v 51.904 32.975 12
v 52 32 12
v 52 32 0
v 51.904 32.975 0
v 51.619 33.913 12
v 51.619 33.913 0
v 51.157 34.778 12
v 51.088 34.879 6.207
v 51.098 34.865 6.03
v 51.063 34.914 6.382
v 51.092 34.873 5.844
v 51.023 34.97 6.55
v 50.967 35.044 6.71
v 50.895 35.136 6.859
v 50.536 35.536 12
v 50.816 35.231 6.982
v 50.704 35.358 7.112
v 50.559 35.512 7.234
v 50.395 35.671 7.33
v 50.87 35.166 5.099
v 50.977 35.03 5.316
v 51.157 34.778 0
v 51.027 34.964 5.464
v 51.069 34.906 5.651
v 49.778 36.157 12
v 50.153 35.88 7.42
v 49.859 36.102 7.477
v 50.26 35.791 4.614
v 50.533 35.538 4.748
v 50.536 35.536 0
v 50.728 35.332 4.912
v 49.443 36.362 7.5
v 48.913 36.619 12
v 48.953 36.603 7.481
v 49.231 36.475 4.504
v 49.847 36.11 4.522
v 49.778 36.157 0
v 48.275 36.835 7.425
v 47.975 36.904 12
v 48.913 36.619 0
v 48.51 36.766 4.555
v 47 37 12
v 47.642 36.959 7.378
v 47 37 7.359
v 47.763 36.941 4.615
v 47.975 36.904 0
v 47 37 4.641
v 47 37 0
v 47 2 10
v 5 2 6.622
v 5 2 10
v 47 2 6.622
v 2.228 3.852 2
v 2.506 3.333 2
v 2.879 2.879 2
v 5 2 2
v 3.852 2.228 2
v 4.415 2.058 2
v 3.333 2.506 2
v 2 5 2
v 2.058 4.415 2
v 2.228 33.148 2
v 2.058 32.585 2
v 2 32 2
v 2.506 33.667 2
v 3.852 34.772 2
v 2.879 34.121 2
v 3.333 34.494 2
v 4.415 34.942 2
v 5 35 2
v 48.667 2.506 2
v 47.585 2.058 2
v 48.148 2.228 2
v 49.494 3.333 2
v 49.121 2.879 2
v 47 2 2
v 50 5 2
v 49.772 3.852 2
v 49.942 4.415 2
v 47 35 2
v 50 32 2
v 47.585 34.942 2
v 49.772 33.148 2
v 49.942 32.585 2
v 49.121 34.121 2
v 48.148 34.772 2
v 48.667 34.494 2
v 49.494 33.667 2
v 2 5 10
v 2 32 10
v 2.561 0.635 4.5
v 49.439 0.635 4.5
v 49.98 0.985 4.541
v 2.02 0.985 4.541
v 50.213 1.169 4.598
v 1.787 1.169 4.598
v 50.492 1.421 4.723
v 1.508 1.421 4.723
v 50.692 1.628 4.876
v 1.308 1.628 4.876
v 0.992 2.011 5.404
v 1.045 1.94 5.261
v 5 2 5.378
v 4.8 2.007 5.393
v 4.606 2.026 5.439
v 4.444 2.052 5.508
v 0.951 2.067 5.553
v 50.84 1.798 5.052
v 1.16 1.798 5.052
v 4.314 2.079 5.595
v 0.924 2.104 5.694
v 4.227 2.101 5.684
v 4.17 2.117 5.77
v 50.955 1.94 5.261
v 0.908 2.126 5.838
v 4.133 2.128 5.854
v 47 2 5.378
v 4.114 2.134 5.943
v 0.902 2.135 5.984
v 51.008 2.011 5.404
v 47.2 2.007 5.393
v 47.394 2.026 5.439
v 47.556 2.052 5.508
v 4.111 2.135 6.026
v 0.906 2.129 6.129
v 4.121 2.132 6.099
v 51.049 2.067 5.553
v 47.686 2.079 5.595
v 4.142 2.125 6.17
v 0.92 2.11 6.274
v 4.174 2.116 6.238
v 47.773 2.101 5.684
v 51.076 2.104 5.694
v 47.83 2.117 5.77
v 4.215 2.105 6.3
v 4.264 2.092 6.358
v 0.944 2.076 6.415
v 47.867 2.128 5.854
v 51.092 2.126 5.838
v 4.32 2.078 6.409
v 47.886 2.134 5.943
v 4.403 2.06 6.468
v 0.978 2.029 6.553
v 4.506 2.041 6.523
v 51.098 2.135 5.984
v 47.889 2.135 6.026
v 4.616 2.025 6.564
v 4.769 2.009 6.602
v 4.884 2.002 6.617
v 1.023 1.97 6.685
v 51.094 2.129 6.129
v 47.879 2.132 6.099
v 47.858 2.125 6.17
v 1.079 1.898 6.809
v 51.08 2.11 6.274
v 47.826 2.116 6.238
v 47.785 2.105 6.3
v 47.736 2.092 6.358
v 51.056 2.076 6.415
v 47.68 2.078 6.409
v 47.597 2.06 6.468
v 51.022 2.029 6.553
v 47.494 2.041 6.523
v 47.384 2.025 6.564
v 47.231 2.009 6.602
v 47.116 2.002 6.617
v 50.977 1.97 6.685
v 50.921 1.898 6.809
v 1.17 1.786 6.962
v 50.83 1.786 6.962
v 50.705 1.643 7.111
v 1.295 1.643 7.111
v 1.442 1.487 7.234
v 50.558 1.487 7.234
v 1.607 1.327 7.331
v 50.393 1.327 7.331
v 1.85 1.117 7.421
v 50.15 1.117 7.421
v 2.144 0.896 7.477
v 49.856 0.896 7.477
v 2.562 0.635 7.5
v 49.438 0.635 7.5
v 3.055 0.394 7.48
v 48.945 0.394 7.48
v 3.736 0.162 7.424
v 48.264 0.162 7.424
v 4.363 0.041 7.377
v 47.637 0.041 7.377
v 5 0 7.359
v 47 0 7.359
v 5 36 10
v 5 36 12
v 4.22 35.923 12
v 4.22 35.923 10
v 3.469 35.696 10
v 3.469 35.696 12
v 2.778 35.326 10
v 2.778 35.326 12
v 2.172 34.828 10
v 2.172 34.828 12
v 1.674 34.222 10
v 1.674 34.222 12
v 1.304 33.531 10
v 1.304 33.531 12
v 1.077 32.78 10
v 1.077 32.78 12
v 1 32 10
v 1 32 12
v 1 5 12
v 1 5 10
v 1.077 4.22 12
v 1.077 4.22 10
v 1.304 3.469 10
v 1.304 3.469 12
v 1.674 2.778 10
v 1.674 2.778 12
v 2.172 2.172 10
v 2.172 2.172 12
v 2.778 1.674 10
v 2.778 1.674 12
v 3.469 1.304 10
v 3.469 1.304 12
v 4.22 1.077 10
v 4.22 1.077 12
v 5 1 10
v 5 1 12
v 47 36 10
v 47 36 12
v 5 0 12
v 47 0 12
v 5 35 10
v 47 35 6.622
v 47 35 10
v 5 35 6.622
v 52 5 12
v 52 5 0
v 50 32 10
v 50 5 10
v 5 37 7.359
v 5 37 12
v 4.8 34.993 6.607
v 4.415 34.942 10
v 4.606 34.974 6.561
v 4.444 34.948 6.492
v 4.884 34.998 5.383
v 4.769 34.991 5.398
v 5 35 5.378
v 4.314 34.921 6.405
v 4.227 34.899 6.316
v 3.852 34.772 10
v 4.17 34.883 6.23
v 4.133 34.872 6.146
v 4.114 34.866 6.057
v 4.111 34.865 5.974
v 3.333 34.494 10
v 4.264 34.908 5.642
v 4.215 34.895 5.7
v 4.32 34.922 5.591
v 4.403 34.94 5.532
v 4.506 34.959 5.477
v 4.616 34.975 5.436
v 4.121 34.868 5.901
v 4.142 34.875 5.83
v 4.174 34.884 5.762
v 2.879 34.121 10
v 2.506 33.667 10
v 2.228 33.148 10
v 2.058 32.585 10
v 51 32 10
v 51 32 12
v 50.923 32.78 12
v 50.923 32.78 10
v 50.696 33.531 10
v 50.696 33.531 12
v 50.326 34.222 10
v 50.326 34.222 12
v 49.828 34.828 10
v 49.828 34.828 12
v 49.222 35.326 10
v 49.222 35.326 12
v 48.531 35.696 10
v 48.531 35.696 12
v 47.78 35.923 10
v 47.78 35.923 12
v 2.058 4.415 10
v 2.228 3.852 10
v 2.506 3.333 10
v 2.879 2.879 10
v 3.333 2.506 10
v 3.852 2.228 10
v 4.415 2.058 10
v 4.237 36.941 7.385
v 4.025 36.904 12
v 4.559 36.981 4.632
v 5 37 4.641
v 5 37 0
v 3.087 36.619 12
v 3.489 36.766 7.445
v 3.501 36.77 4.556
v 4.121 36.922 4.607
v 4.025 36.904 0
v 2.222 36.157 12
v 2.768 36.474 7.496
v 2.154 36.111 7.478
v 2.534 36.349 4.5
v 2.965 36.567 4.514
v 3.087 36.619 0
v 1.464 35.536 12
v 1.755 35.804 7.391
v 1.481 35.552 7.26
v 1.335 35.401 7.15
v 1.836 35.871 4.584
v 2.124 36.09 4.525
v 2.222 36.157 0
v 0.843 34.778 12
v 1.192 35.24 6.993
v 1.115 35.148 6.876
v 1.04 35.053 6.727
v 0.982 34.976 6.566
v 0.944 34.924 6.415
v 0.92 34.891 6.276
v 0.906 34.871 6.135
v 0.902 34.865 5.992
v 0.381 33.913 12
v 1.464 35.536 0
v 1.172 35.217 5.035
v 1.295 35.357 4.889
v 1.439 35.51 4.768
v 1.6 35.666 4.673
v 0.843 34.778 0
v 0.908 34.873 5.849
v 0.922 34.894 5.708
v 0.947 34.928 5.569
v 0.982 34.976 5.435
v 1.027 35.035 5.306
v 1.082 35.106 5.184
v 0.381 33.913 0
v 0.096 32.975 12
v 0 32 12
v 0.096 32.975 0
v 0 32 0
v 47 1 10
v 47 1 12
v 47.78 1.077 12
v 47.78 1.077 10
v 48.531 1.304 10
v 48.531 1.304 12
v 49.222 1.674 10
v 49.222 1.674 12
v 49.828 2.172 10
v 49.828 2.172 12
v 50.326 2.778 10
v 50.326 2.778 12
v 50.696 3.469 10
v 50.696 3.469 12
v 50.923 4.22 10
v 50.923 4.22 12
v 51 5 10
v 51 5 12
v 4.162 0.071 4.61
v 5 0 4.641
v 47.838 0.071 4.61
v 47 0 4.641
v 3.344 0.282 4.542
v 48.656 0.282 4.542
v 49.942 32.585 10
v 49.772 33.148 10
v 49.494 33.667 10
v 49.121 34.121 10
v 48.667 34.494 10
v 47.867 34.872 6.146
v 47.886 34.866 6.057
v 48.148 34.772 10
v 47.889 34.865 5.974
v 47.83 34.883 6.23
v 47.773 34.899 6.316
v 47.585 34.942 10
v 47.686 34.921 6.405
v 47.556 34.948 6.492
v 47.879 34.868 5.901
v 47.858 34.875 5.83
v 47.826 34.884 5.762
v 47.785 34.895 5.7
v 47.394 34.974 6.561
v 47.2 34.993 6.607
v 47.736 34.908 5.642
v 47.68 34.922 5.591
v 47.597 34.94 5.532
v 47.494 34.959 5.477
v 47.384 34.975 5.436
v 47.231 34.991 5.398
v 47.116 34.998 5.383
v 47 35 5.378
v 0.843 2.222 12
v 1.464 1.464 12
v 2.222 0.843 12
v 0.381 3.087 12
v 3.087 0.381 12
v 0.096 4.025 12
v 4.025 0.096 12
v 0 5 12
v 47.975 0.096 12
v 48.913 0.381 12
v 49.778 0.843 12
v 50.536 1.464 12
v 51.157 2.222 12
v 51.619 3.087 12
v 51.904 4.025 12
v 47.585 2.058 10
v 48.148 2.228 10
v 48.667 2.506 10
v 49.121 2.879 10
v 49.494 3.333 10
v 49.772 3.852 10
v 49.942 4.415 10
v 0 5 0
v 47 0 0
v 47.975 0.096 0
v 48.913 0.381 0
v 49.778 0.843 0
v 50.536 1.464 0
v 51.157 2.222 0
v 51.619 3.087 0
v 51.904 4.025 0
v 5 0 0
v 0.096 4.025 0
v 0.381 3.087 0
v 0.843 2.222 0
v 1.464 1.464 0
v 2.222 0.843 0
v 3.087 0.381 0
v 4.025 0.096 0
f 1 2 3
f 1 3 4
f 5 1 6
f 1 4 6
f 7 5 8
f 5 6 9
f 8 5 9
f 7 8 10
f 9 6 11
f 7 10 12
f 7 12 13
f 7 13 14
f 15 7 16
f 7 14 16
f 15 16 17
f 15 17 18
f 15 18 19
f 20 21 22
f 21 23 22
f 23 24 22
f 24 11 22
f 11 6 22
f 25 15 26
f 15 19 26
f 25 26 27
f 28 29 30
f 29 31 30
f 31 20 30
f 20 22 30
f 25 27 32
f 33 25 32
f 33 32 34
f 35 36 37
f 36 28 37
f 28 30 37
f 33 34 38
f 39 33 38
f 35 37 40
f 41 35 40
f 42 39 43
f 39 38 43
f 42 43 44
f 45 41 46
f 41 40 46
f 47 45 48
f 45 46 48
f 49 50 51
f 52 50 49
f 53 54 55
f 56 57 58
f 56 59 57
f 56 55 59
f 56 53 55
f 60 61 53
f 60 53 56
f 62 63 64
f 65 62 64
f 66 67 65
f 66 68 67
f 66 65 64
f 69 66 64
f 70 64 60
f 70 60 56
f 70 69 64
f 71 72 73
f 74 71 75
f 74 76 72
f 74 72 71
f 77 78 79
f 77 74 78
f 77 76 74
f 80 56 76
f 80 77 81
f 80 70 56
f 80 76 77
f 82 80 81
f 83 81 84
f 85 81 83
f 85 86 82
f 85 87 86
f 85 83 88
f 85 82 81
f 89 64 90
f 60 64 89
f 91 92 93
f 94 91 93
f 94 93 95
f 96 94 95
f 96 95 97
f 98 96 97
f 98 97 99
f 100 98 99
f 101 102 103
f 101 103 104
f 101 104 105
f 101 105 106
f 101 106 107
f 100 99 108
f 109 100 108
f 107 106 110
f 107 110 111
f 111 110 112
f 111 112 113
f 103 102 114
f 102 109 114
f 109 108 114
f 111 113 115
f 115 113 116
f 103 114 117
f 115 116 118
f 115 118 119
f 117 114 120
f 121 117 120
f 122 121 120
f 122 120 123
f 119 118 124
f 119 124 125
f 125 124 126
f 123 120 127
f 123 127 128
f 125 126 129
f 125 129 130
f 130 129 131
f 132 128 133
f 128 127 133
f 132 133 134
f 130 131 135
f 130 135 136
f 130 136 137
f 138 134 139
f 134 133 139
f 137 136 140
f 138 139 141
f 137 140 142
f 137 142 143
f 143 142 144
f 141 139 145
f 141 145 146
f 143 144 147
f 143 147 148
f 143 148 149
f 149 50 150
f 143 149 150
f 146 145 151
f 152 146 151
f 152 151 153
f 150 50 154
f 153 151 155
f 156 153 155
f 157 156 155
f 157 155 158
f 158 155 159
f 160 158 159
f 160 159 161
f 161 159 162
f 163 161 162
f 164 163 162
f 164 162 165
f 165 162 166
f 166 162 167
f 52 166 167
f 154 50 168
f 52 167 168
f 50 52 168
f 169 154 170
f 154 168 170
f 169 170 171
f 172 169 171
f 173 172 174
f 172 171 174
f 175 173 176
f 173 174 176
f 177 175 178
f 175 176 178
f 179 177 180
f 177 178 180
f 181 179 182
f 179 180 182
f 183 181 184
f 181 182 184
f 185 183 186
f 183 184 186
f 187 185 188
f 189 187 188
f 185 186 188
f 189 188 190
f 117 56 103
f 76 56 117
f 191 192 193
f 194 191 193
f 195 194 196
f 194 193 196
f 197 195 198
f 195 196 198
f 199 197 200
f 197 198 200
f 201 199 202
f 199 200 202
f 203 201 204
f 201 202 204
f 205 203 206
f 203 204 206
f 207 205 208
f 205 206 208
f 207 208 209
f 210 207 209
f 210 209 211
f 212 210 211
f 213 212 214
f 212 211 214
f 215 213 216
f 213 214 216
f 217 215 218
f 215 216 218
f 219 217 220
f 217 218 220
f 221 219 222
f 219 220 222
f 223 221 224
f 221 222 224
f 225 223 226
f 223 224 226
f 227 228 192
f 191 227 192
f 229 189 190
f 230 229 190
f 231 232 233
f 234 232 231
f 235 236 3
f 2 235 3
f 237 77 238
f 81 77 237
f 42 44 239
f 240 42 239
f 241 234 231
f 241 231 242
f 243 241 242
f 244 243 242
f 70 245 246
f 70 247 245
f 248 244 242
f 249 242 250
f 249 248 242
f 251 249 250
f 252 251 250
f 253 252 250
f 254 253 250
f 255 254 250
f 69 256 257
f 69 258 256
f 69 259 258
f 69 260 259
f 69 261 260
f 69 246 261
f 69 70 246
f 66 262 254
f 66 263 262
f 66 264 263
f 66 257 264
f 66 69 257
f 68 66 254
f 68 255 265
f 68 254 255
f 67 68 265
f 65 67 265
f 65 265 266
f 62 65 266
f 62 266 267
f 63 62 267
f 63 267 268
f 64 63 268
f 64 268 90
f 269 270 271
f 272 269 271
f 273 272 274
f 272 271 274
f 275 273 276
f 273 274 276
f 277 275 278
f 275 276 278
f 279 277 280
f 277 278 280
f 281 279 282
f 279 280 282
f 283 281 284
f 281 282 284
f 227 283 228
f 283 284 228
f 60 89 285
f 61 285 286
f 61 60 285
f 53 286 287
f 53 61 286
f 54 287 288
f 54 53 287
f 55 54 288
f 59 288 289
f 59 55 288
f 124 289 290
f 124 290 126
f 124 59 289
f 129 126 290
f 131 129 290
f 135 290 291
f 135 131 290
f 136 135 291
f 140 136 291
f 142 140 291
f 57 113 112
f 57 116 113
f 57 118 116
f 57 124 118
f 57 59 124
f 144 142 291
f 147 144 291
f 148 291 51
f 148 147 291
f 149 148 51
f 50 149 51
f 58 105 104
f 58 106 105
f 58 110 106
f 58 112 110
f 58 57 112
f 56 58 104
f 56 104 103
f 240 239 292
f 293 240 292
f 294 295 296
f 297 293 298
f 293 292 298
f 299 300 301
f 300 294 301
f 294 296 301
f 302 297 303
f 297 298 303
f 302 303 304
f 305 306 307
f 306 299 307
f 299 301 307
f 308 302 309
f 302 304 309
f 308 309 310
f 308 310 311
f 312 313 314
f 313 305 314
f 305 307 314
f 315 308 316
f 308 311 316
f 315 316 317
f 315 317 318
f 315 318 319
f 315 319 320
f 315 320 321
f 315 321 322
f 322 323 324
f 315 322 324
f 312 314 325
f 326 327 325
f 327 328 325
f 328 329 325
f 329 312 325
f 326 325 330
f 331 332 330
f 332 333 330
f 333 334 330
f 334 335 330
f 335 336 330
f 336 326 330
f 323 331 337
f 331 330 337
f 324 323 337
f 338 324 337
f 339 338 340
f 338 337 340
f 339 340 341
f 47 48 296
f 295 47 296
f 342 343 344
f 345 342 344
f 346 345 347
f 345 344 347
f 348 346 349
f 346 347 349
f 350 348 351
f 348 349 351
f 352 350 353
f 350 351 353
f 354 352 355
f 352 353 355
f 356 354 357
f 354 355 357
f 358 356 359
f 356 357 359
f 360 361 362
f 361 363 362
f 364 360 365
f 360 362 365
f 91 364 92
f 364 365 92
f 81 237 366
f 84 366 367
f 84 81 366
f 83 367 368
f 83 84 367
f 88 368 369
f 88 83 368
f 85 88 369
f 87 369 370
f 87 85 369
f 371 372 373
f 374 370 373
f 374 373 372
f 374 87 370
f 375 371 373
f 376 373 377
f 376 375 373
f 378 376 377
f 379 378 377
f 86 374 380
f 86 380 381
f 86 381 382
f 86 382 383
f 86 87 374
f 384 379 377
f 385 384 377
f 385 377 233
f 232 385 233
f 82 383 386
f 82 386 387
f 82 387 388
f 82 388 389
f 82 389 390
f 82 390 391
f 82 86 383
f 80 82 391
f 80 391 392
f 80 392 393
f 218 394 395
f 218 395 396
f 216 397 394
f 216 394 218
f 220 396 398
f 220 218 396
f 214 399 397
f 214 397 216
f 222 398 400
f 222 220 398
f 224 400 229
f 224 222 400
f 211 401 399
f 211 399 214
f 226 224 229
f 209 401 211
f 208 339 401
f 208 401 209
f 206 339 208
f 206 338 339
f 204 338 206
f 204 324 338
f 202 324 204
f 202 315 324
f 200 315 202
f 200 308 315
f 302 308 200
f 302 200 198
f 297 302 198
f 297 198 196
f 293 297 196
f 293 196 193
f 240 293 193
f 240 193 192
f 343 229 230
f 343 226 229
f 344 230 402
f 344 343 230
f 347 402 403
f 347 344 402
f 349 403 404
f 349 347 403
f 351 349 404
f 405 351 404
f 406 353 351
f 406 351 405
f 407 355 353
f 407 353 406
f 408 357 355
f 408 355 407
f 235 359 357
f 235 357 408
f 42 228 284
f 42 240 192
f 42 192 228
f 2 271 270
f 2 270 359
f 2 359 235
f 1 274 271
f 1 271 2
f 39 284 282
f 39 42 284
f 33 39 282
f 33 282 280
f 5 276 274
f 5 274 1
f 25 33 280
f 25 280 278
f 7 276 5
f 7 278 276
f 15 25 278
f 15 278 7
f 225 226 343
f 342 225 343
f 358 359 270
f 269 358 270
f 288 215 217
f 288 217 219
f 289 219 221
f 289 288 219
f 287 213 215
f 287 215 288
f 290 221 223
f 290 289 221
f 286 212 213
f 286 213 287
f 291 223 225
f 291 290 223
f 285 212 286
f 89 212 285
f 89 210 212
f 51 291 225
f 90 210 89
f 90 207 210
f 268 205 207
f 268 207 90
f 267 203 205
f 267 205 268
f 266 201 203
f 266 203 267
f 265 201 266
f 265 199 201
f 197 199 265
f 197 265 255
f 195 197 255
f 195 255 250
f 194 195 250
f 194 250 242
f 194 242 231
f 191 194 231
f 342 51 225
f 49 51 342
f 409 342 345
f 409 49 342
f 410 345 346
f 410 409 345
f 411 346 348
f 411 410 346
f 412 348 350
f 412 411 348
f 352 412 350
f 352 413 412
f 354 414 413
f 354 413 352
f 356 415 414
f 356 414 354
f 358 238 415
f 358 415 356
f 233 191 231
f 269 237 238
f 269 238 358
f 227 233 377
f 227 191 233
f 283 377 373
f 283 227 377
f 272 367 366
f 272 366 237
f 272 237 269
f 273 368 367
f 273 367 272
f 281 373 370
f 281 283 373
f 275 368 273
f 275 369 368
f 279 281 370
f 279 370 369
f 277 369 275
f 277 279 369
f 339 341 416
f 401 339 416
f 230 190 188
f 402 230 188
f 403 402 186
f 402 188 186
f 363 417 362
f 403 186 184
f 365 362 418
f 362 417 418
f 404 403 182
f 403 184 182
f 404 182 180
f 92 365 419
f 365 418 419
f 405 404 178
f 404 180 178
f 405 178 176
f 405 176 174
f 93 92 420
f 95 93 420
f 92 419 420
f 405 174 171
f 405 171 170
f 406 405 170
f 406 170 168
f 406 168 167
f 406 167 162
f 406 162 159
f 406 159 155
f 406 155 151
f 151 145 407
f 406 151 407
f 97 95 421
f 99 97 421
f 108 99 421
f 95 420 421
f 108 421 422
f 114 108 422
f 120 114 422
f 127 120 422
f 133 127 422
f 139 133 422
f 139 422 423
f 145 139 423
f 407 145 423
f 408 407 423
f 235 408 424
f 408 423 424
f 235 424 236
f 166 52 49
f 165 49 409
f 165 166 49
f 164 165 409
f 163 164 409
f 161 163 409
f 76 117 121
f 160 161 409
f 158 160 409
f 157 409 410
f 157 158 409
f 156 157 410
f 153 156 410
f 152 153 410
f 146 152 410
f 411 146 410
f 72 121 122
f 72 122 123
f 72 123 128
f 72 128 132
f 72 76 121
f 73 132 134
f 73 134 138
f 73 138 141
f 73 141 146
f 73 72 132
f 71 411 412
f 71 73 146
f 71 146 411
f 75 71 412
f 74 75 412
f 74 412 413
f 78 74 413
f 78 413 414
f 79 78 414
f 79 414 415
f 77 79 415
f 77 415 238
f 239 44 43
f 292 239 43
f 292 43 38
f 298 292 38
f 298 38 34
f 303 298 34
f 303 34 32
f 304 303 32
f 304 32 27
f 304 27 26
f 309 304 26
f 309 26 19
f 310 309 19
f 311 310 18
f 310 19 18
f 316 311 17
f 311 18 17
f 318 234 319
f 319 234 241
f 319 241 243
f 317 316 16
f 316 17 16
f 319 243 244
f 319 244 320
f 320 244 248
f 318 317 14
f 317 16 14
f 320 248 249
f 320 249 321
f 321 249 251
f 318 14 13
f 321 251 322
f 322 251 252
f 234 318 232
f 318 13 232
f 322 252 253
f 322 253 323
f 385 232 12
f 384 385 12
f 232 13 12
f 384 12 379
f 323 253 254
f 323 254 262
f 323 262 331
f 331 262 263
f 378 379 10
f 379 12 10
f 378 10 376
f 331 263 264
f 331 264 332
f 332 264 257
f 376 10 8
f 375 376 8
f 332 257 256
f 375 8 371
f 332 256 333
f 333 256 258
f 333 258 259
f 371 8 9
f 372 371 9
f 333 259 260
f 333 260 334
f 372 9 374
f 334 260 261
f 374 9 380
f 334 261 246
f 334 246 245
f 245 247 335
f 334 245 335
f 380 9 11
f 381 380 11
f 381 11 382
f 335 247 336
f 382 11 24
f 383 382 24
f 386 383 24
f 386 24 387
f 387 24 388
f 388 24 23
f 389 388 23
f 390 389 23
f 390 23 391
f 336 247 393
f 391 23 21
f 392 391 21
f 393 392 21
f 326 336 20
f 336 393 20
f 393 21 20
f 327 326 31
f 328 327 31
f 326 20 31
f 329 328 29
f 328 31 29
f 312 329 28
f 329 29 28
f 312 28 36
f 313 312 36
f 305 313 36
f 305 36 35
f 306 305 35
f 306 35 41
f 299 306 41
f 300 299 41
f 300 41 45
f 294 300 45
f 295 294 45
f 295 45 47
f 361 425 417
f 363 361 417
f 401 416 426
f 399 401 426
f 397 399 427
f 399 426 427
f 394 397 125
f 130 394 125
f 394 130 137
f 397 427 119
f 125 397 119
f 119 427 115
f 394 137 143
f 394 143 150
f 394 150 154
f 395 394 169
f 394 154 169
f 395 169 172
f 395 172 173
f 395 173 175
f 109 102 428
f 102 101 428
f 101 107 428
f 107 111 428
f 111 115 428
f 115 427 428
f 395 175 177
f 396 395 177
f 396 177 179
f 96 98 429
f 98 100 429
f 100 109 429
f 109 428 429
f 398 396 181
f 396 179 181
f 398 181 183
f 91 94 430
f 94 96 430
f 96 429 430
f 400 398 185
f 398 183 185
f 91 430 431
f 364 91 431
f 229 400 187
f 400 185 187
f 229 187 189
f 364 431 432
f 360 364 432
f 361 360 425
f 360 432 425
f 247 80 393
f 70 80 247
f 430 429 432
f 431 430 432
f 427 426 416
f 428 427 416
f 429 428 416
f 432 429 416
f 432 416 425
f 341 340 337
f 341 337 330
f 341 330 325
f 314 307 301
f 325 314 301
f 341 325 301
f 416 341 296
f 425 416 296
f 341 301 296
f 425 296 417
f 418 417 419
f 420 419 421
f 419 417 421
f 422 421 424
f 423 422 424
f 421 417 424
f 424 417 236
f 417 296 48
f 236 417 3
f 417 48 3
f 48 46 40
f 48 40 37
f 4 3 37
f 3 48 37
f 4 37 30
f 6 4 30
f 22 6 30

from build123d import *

# Parameters (mm, degrees)
BOSS_EXTRU_1_DEPTH      = 12
COQUE5_T                = -2
ENL_V_MAT_EXTRU_1_DEPTH = 2
ESQUISSE7_R             = 1.5
ENL_V_MAT_EXTRU_2_DEPTH = 65.93843238
ESQUISSE8_R             = 1.5
ENL_V_MAT_EXTRU_3_DEPTH = 65.938432536


with BuildPart() as part:
    # Esquisse1 → Boss.-Extru.1 (new body)
    with BuildSketch(Plane.XY):
        with BuildLine():
            Line((5, 0), (47, 0))
            ThreePointArc((47, 0), (50.535533906, 1.464466094), (52, 5))
            Line((52, 5), (52, 32))
            ThreePointArc((52, 32), (50.535533906, 35.535533906), (47, 37))
            Line((47, 37), (5, 37))
            ThreePointArc((5, 37), (1.464466094, 35.535533906), (0, 32))
            Line((0, 32), (0, 5))
            ThreePointArc((0, 5), (1.464466094, 1.464466094), (5, 0))
        make_face()
    extrude(amount=BOSS_EXTRU_1_DEPTH)

    # Coque5
    coque5_openings = [part.faces().sort_by_distance(p)[0] for p in [
        (26, 18.5, 12),
    ]]
    offset(amount=COQUE5_T, openings=coque5_openings, kind=Kind.INTERSECTION)

    # Esquisse3 → Enlèv. mat.-Extru.1 (cut)
    with BuildSketch(Plane.XY.offset(12)):
        with BuildLine():
            ThreePointArc((51, 32), (49.828427125, 34.828427125), (47, 36))
            Line((47, 36), (5, 36))
            ThreePointArc((5, 36), (2.171572875, 34.828427125), (1, 32))
            Line((1, 32), (1, 5))
            ThreePointArc((1, 5), (2.171572875, 2.171572875), (5, 1))
            Line((5, 1), (47, 1))
            ThreePointArc((47, 1), (49.828427125, 2.171572875), (51, 5))
            Line((51, 5), (51, 32))
        make_face()
    extrude(amount=-ENL_V_MAT_EXTRU_1_DEPTH, mode=Mode.SUBTRACT)

    # Esquisse7 → Enlèv. mat.-Extru.2 (cut, through all)
    with BuildSketch(Plane(origin=(52, 0, 0), x_dir=(0, 0, -1), z_dir=(1, 0, 0))):
        with Locations((-6, 36.365)):
            Circle(ESQUISSE7_R)
    extrude(amount=-ENL_V_MAT_EXTRU_2_DEPTH, mode=Mode.SUBTRACT)

    # Esquisse8 → Enlèv. mat.-Extru.3 (cut, through all)
    with BuildSketch(Plane(origin=(52, 0, 0), x_dir=(0, 0, -1), z_dir=(1, 0, 0))):
        with Locations((-6, 0.635)):
            Circle(ESQUISSE8_R)
    extrude(amount=-ENL_V_MAT_EXTRU_3_DEPTH, mode=Mode.SUBTRACT)


solid = part.part
